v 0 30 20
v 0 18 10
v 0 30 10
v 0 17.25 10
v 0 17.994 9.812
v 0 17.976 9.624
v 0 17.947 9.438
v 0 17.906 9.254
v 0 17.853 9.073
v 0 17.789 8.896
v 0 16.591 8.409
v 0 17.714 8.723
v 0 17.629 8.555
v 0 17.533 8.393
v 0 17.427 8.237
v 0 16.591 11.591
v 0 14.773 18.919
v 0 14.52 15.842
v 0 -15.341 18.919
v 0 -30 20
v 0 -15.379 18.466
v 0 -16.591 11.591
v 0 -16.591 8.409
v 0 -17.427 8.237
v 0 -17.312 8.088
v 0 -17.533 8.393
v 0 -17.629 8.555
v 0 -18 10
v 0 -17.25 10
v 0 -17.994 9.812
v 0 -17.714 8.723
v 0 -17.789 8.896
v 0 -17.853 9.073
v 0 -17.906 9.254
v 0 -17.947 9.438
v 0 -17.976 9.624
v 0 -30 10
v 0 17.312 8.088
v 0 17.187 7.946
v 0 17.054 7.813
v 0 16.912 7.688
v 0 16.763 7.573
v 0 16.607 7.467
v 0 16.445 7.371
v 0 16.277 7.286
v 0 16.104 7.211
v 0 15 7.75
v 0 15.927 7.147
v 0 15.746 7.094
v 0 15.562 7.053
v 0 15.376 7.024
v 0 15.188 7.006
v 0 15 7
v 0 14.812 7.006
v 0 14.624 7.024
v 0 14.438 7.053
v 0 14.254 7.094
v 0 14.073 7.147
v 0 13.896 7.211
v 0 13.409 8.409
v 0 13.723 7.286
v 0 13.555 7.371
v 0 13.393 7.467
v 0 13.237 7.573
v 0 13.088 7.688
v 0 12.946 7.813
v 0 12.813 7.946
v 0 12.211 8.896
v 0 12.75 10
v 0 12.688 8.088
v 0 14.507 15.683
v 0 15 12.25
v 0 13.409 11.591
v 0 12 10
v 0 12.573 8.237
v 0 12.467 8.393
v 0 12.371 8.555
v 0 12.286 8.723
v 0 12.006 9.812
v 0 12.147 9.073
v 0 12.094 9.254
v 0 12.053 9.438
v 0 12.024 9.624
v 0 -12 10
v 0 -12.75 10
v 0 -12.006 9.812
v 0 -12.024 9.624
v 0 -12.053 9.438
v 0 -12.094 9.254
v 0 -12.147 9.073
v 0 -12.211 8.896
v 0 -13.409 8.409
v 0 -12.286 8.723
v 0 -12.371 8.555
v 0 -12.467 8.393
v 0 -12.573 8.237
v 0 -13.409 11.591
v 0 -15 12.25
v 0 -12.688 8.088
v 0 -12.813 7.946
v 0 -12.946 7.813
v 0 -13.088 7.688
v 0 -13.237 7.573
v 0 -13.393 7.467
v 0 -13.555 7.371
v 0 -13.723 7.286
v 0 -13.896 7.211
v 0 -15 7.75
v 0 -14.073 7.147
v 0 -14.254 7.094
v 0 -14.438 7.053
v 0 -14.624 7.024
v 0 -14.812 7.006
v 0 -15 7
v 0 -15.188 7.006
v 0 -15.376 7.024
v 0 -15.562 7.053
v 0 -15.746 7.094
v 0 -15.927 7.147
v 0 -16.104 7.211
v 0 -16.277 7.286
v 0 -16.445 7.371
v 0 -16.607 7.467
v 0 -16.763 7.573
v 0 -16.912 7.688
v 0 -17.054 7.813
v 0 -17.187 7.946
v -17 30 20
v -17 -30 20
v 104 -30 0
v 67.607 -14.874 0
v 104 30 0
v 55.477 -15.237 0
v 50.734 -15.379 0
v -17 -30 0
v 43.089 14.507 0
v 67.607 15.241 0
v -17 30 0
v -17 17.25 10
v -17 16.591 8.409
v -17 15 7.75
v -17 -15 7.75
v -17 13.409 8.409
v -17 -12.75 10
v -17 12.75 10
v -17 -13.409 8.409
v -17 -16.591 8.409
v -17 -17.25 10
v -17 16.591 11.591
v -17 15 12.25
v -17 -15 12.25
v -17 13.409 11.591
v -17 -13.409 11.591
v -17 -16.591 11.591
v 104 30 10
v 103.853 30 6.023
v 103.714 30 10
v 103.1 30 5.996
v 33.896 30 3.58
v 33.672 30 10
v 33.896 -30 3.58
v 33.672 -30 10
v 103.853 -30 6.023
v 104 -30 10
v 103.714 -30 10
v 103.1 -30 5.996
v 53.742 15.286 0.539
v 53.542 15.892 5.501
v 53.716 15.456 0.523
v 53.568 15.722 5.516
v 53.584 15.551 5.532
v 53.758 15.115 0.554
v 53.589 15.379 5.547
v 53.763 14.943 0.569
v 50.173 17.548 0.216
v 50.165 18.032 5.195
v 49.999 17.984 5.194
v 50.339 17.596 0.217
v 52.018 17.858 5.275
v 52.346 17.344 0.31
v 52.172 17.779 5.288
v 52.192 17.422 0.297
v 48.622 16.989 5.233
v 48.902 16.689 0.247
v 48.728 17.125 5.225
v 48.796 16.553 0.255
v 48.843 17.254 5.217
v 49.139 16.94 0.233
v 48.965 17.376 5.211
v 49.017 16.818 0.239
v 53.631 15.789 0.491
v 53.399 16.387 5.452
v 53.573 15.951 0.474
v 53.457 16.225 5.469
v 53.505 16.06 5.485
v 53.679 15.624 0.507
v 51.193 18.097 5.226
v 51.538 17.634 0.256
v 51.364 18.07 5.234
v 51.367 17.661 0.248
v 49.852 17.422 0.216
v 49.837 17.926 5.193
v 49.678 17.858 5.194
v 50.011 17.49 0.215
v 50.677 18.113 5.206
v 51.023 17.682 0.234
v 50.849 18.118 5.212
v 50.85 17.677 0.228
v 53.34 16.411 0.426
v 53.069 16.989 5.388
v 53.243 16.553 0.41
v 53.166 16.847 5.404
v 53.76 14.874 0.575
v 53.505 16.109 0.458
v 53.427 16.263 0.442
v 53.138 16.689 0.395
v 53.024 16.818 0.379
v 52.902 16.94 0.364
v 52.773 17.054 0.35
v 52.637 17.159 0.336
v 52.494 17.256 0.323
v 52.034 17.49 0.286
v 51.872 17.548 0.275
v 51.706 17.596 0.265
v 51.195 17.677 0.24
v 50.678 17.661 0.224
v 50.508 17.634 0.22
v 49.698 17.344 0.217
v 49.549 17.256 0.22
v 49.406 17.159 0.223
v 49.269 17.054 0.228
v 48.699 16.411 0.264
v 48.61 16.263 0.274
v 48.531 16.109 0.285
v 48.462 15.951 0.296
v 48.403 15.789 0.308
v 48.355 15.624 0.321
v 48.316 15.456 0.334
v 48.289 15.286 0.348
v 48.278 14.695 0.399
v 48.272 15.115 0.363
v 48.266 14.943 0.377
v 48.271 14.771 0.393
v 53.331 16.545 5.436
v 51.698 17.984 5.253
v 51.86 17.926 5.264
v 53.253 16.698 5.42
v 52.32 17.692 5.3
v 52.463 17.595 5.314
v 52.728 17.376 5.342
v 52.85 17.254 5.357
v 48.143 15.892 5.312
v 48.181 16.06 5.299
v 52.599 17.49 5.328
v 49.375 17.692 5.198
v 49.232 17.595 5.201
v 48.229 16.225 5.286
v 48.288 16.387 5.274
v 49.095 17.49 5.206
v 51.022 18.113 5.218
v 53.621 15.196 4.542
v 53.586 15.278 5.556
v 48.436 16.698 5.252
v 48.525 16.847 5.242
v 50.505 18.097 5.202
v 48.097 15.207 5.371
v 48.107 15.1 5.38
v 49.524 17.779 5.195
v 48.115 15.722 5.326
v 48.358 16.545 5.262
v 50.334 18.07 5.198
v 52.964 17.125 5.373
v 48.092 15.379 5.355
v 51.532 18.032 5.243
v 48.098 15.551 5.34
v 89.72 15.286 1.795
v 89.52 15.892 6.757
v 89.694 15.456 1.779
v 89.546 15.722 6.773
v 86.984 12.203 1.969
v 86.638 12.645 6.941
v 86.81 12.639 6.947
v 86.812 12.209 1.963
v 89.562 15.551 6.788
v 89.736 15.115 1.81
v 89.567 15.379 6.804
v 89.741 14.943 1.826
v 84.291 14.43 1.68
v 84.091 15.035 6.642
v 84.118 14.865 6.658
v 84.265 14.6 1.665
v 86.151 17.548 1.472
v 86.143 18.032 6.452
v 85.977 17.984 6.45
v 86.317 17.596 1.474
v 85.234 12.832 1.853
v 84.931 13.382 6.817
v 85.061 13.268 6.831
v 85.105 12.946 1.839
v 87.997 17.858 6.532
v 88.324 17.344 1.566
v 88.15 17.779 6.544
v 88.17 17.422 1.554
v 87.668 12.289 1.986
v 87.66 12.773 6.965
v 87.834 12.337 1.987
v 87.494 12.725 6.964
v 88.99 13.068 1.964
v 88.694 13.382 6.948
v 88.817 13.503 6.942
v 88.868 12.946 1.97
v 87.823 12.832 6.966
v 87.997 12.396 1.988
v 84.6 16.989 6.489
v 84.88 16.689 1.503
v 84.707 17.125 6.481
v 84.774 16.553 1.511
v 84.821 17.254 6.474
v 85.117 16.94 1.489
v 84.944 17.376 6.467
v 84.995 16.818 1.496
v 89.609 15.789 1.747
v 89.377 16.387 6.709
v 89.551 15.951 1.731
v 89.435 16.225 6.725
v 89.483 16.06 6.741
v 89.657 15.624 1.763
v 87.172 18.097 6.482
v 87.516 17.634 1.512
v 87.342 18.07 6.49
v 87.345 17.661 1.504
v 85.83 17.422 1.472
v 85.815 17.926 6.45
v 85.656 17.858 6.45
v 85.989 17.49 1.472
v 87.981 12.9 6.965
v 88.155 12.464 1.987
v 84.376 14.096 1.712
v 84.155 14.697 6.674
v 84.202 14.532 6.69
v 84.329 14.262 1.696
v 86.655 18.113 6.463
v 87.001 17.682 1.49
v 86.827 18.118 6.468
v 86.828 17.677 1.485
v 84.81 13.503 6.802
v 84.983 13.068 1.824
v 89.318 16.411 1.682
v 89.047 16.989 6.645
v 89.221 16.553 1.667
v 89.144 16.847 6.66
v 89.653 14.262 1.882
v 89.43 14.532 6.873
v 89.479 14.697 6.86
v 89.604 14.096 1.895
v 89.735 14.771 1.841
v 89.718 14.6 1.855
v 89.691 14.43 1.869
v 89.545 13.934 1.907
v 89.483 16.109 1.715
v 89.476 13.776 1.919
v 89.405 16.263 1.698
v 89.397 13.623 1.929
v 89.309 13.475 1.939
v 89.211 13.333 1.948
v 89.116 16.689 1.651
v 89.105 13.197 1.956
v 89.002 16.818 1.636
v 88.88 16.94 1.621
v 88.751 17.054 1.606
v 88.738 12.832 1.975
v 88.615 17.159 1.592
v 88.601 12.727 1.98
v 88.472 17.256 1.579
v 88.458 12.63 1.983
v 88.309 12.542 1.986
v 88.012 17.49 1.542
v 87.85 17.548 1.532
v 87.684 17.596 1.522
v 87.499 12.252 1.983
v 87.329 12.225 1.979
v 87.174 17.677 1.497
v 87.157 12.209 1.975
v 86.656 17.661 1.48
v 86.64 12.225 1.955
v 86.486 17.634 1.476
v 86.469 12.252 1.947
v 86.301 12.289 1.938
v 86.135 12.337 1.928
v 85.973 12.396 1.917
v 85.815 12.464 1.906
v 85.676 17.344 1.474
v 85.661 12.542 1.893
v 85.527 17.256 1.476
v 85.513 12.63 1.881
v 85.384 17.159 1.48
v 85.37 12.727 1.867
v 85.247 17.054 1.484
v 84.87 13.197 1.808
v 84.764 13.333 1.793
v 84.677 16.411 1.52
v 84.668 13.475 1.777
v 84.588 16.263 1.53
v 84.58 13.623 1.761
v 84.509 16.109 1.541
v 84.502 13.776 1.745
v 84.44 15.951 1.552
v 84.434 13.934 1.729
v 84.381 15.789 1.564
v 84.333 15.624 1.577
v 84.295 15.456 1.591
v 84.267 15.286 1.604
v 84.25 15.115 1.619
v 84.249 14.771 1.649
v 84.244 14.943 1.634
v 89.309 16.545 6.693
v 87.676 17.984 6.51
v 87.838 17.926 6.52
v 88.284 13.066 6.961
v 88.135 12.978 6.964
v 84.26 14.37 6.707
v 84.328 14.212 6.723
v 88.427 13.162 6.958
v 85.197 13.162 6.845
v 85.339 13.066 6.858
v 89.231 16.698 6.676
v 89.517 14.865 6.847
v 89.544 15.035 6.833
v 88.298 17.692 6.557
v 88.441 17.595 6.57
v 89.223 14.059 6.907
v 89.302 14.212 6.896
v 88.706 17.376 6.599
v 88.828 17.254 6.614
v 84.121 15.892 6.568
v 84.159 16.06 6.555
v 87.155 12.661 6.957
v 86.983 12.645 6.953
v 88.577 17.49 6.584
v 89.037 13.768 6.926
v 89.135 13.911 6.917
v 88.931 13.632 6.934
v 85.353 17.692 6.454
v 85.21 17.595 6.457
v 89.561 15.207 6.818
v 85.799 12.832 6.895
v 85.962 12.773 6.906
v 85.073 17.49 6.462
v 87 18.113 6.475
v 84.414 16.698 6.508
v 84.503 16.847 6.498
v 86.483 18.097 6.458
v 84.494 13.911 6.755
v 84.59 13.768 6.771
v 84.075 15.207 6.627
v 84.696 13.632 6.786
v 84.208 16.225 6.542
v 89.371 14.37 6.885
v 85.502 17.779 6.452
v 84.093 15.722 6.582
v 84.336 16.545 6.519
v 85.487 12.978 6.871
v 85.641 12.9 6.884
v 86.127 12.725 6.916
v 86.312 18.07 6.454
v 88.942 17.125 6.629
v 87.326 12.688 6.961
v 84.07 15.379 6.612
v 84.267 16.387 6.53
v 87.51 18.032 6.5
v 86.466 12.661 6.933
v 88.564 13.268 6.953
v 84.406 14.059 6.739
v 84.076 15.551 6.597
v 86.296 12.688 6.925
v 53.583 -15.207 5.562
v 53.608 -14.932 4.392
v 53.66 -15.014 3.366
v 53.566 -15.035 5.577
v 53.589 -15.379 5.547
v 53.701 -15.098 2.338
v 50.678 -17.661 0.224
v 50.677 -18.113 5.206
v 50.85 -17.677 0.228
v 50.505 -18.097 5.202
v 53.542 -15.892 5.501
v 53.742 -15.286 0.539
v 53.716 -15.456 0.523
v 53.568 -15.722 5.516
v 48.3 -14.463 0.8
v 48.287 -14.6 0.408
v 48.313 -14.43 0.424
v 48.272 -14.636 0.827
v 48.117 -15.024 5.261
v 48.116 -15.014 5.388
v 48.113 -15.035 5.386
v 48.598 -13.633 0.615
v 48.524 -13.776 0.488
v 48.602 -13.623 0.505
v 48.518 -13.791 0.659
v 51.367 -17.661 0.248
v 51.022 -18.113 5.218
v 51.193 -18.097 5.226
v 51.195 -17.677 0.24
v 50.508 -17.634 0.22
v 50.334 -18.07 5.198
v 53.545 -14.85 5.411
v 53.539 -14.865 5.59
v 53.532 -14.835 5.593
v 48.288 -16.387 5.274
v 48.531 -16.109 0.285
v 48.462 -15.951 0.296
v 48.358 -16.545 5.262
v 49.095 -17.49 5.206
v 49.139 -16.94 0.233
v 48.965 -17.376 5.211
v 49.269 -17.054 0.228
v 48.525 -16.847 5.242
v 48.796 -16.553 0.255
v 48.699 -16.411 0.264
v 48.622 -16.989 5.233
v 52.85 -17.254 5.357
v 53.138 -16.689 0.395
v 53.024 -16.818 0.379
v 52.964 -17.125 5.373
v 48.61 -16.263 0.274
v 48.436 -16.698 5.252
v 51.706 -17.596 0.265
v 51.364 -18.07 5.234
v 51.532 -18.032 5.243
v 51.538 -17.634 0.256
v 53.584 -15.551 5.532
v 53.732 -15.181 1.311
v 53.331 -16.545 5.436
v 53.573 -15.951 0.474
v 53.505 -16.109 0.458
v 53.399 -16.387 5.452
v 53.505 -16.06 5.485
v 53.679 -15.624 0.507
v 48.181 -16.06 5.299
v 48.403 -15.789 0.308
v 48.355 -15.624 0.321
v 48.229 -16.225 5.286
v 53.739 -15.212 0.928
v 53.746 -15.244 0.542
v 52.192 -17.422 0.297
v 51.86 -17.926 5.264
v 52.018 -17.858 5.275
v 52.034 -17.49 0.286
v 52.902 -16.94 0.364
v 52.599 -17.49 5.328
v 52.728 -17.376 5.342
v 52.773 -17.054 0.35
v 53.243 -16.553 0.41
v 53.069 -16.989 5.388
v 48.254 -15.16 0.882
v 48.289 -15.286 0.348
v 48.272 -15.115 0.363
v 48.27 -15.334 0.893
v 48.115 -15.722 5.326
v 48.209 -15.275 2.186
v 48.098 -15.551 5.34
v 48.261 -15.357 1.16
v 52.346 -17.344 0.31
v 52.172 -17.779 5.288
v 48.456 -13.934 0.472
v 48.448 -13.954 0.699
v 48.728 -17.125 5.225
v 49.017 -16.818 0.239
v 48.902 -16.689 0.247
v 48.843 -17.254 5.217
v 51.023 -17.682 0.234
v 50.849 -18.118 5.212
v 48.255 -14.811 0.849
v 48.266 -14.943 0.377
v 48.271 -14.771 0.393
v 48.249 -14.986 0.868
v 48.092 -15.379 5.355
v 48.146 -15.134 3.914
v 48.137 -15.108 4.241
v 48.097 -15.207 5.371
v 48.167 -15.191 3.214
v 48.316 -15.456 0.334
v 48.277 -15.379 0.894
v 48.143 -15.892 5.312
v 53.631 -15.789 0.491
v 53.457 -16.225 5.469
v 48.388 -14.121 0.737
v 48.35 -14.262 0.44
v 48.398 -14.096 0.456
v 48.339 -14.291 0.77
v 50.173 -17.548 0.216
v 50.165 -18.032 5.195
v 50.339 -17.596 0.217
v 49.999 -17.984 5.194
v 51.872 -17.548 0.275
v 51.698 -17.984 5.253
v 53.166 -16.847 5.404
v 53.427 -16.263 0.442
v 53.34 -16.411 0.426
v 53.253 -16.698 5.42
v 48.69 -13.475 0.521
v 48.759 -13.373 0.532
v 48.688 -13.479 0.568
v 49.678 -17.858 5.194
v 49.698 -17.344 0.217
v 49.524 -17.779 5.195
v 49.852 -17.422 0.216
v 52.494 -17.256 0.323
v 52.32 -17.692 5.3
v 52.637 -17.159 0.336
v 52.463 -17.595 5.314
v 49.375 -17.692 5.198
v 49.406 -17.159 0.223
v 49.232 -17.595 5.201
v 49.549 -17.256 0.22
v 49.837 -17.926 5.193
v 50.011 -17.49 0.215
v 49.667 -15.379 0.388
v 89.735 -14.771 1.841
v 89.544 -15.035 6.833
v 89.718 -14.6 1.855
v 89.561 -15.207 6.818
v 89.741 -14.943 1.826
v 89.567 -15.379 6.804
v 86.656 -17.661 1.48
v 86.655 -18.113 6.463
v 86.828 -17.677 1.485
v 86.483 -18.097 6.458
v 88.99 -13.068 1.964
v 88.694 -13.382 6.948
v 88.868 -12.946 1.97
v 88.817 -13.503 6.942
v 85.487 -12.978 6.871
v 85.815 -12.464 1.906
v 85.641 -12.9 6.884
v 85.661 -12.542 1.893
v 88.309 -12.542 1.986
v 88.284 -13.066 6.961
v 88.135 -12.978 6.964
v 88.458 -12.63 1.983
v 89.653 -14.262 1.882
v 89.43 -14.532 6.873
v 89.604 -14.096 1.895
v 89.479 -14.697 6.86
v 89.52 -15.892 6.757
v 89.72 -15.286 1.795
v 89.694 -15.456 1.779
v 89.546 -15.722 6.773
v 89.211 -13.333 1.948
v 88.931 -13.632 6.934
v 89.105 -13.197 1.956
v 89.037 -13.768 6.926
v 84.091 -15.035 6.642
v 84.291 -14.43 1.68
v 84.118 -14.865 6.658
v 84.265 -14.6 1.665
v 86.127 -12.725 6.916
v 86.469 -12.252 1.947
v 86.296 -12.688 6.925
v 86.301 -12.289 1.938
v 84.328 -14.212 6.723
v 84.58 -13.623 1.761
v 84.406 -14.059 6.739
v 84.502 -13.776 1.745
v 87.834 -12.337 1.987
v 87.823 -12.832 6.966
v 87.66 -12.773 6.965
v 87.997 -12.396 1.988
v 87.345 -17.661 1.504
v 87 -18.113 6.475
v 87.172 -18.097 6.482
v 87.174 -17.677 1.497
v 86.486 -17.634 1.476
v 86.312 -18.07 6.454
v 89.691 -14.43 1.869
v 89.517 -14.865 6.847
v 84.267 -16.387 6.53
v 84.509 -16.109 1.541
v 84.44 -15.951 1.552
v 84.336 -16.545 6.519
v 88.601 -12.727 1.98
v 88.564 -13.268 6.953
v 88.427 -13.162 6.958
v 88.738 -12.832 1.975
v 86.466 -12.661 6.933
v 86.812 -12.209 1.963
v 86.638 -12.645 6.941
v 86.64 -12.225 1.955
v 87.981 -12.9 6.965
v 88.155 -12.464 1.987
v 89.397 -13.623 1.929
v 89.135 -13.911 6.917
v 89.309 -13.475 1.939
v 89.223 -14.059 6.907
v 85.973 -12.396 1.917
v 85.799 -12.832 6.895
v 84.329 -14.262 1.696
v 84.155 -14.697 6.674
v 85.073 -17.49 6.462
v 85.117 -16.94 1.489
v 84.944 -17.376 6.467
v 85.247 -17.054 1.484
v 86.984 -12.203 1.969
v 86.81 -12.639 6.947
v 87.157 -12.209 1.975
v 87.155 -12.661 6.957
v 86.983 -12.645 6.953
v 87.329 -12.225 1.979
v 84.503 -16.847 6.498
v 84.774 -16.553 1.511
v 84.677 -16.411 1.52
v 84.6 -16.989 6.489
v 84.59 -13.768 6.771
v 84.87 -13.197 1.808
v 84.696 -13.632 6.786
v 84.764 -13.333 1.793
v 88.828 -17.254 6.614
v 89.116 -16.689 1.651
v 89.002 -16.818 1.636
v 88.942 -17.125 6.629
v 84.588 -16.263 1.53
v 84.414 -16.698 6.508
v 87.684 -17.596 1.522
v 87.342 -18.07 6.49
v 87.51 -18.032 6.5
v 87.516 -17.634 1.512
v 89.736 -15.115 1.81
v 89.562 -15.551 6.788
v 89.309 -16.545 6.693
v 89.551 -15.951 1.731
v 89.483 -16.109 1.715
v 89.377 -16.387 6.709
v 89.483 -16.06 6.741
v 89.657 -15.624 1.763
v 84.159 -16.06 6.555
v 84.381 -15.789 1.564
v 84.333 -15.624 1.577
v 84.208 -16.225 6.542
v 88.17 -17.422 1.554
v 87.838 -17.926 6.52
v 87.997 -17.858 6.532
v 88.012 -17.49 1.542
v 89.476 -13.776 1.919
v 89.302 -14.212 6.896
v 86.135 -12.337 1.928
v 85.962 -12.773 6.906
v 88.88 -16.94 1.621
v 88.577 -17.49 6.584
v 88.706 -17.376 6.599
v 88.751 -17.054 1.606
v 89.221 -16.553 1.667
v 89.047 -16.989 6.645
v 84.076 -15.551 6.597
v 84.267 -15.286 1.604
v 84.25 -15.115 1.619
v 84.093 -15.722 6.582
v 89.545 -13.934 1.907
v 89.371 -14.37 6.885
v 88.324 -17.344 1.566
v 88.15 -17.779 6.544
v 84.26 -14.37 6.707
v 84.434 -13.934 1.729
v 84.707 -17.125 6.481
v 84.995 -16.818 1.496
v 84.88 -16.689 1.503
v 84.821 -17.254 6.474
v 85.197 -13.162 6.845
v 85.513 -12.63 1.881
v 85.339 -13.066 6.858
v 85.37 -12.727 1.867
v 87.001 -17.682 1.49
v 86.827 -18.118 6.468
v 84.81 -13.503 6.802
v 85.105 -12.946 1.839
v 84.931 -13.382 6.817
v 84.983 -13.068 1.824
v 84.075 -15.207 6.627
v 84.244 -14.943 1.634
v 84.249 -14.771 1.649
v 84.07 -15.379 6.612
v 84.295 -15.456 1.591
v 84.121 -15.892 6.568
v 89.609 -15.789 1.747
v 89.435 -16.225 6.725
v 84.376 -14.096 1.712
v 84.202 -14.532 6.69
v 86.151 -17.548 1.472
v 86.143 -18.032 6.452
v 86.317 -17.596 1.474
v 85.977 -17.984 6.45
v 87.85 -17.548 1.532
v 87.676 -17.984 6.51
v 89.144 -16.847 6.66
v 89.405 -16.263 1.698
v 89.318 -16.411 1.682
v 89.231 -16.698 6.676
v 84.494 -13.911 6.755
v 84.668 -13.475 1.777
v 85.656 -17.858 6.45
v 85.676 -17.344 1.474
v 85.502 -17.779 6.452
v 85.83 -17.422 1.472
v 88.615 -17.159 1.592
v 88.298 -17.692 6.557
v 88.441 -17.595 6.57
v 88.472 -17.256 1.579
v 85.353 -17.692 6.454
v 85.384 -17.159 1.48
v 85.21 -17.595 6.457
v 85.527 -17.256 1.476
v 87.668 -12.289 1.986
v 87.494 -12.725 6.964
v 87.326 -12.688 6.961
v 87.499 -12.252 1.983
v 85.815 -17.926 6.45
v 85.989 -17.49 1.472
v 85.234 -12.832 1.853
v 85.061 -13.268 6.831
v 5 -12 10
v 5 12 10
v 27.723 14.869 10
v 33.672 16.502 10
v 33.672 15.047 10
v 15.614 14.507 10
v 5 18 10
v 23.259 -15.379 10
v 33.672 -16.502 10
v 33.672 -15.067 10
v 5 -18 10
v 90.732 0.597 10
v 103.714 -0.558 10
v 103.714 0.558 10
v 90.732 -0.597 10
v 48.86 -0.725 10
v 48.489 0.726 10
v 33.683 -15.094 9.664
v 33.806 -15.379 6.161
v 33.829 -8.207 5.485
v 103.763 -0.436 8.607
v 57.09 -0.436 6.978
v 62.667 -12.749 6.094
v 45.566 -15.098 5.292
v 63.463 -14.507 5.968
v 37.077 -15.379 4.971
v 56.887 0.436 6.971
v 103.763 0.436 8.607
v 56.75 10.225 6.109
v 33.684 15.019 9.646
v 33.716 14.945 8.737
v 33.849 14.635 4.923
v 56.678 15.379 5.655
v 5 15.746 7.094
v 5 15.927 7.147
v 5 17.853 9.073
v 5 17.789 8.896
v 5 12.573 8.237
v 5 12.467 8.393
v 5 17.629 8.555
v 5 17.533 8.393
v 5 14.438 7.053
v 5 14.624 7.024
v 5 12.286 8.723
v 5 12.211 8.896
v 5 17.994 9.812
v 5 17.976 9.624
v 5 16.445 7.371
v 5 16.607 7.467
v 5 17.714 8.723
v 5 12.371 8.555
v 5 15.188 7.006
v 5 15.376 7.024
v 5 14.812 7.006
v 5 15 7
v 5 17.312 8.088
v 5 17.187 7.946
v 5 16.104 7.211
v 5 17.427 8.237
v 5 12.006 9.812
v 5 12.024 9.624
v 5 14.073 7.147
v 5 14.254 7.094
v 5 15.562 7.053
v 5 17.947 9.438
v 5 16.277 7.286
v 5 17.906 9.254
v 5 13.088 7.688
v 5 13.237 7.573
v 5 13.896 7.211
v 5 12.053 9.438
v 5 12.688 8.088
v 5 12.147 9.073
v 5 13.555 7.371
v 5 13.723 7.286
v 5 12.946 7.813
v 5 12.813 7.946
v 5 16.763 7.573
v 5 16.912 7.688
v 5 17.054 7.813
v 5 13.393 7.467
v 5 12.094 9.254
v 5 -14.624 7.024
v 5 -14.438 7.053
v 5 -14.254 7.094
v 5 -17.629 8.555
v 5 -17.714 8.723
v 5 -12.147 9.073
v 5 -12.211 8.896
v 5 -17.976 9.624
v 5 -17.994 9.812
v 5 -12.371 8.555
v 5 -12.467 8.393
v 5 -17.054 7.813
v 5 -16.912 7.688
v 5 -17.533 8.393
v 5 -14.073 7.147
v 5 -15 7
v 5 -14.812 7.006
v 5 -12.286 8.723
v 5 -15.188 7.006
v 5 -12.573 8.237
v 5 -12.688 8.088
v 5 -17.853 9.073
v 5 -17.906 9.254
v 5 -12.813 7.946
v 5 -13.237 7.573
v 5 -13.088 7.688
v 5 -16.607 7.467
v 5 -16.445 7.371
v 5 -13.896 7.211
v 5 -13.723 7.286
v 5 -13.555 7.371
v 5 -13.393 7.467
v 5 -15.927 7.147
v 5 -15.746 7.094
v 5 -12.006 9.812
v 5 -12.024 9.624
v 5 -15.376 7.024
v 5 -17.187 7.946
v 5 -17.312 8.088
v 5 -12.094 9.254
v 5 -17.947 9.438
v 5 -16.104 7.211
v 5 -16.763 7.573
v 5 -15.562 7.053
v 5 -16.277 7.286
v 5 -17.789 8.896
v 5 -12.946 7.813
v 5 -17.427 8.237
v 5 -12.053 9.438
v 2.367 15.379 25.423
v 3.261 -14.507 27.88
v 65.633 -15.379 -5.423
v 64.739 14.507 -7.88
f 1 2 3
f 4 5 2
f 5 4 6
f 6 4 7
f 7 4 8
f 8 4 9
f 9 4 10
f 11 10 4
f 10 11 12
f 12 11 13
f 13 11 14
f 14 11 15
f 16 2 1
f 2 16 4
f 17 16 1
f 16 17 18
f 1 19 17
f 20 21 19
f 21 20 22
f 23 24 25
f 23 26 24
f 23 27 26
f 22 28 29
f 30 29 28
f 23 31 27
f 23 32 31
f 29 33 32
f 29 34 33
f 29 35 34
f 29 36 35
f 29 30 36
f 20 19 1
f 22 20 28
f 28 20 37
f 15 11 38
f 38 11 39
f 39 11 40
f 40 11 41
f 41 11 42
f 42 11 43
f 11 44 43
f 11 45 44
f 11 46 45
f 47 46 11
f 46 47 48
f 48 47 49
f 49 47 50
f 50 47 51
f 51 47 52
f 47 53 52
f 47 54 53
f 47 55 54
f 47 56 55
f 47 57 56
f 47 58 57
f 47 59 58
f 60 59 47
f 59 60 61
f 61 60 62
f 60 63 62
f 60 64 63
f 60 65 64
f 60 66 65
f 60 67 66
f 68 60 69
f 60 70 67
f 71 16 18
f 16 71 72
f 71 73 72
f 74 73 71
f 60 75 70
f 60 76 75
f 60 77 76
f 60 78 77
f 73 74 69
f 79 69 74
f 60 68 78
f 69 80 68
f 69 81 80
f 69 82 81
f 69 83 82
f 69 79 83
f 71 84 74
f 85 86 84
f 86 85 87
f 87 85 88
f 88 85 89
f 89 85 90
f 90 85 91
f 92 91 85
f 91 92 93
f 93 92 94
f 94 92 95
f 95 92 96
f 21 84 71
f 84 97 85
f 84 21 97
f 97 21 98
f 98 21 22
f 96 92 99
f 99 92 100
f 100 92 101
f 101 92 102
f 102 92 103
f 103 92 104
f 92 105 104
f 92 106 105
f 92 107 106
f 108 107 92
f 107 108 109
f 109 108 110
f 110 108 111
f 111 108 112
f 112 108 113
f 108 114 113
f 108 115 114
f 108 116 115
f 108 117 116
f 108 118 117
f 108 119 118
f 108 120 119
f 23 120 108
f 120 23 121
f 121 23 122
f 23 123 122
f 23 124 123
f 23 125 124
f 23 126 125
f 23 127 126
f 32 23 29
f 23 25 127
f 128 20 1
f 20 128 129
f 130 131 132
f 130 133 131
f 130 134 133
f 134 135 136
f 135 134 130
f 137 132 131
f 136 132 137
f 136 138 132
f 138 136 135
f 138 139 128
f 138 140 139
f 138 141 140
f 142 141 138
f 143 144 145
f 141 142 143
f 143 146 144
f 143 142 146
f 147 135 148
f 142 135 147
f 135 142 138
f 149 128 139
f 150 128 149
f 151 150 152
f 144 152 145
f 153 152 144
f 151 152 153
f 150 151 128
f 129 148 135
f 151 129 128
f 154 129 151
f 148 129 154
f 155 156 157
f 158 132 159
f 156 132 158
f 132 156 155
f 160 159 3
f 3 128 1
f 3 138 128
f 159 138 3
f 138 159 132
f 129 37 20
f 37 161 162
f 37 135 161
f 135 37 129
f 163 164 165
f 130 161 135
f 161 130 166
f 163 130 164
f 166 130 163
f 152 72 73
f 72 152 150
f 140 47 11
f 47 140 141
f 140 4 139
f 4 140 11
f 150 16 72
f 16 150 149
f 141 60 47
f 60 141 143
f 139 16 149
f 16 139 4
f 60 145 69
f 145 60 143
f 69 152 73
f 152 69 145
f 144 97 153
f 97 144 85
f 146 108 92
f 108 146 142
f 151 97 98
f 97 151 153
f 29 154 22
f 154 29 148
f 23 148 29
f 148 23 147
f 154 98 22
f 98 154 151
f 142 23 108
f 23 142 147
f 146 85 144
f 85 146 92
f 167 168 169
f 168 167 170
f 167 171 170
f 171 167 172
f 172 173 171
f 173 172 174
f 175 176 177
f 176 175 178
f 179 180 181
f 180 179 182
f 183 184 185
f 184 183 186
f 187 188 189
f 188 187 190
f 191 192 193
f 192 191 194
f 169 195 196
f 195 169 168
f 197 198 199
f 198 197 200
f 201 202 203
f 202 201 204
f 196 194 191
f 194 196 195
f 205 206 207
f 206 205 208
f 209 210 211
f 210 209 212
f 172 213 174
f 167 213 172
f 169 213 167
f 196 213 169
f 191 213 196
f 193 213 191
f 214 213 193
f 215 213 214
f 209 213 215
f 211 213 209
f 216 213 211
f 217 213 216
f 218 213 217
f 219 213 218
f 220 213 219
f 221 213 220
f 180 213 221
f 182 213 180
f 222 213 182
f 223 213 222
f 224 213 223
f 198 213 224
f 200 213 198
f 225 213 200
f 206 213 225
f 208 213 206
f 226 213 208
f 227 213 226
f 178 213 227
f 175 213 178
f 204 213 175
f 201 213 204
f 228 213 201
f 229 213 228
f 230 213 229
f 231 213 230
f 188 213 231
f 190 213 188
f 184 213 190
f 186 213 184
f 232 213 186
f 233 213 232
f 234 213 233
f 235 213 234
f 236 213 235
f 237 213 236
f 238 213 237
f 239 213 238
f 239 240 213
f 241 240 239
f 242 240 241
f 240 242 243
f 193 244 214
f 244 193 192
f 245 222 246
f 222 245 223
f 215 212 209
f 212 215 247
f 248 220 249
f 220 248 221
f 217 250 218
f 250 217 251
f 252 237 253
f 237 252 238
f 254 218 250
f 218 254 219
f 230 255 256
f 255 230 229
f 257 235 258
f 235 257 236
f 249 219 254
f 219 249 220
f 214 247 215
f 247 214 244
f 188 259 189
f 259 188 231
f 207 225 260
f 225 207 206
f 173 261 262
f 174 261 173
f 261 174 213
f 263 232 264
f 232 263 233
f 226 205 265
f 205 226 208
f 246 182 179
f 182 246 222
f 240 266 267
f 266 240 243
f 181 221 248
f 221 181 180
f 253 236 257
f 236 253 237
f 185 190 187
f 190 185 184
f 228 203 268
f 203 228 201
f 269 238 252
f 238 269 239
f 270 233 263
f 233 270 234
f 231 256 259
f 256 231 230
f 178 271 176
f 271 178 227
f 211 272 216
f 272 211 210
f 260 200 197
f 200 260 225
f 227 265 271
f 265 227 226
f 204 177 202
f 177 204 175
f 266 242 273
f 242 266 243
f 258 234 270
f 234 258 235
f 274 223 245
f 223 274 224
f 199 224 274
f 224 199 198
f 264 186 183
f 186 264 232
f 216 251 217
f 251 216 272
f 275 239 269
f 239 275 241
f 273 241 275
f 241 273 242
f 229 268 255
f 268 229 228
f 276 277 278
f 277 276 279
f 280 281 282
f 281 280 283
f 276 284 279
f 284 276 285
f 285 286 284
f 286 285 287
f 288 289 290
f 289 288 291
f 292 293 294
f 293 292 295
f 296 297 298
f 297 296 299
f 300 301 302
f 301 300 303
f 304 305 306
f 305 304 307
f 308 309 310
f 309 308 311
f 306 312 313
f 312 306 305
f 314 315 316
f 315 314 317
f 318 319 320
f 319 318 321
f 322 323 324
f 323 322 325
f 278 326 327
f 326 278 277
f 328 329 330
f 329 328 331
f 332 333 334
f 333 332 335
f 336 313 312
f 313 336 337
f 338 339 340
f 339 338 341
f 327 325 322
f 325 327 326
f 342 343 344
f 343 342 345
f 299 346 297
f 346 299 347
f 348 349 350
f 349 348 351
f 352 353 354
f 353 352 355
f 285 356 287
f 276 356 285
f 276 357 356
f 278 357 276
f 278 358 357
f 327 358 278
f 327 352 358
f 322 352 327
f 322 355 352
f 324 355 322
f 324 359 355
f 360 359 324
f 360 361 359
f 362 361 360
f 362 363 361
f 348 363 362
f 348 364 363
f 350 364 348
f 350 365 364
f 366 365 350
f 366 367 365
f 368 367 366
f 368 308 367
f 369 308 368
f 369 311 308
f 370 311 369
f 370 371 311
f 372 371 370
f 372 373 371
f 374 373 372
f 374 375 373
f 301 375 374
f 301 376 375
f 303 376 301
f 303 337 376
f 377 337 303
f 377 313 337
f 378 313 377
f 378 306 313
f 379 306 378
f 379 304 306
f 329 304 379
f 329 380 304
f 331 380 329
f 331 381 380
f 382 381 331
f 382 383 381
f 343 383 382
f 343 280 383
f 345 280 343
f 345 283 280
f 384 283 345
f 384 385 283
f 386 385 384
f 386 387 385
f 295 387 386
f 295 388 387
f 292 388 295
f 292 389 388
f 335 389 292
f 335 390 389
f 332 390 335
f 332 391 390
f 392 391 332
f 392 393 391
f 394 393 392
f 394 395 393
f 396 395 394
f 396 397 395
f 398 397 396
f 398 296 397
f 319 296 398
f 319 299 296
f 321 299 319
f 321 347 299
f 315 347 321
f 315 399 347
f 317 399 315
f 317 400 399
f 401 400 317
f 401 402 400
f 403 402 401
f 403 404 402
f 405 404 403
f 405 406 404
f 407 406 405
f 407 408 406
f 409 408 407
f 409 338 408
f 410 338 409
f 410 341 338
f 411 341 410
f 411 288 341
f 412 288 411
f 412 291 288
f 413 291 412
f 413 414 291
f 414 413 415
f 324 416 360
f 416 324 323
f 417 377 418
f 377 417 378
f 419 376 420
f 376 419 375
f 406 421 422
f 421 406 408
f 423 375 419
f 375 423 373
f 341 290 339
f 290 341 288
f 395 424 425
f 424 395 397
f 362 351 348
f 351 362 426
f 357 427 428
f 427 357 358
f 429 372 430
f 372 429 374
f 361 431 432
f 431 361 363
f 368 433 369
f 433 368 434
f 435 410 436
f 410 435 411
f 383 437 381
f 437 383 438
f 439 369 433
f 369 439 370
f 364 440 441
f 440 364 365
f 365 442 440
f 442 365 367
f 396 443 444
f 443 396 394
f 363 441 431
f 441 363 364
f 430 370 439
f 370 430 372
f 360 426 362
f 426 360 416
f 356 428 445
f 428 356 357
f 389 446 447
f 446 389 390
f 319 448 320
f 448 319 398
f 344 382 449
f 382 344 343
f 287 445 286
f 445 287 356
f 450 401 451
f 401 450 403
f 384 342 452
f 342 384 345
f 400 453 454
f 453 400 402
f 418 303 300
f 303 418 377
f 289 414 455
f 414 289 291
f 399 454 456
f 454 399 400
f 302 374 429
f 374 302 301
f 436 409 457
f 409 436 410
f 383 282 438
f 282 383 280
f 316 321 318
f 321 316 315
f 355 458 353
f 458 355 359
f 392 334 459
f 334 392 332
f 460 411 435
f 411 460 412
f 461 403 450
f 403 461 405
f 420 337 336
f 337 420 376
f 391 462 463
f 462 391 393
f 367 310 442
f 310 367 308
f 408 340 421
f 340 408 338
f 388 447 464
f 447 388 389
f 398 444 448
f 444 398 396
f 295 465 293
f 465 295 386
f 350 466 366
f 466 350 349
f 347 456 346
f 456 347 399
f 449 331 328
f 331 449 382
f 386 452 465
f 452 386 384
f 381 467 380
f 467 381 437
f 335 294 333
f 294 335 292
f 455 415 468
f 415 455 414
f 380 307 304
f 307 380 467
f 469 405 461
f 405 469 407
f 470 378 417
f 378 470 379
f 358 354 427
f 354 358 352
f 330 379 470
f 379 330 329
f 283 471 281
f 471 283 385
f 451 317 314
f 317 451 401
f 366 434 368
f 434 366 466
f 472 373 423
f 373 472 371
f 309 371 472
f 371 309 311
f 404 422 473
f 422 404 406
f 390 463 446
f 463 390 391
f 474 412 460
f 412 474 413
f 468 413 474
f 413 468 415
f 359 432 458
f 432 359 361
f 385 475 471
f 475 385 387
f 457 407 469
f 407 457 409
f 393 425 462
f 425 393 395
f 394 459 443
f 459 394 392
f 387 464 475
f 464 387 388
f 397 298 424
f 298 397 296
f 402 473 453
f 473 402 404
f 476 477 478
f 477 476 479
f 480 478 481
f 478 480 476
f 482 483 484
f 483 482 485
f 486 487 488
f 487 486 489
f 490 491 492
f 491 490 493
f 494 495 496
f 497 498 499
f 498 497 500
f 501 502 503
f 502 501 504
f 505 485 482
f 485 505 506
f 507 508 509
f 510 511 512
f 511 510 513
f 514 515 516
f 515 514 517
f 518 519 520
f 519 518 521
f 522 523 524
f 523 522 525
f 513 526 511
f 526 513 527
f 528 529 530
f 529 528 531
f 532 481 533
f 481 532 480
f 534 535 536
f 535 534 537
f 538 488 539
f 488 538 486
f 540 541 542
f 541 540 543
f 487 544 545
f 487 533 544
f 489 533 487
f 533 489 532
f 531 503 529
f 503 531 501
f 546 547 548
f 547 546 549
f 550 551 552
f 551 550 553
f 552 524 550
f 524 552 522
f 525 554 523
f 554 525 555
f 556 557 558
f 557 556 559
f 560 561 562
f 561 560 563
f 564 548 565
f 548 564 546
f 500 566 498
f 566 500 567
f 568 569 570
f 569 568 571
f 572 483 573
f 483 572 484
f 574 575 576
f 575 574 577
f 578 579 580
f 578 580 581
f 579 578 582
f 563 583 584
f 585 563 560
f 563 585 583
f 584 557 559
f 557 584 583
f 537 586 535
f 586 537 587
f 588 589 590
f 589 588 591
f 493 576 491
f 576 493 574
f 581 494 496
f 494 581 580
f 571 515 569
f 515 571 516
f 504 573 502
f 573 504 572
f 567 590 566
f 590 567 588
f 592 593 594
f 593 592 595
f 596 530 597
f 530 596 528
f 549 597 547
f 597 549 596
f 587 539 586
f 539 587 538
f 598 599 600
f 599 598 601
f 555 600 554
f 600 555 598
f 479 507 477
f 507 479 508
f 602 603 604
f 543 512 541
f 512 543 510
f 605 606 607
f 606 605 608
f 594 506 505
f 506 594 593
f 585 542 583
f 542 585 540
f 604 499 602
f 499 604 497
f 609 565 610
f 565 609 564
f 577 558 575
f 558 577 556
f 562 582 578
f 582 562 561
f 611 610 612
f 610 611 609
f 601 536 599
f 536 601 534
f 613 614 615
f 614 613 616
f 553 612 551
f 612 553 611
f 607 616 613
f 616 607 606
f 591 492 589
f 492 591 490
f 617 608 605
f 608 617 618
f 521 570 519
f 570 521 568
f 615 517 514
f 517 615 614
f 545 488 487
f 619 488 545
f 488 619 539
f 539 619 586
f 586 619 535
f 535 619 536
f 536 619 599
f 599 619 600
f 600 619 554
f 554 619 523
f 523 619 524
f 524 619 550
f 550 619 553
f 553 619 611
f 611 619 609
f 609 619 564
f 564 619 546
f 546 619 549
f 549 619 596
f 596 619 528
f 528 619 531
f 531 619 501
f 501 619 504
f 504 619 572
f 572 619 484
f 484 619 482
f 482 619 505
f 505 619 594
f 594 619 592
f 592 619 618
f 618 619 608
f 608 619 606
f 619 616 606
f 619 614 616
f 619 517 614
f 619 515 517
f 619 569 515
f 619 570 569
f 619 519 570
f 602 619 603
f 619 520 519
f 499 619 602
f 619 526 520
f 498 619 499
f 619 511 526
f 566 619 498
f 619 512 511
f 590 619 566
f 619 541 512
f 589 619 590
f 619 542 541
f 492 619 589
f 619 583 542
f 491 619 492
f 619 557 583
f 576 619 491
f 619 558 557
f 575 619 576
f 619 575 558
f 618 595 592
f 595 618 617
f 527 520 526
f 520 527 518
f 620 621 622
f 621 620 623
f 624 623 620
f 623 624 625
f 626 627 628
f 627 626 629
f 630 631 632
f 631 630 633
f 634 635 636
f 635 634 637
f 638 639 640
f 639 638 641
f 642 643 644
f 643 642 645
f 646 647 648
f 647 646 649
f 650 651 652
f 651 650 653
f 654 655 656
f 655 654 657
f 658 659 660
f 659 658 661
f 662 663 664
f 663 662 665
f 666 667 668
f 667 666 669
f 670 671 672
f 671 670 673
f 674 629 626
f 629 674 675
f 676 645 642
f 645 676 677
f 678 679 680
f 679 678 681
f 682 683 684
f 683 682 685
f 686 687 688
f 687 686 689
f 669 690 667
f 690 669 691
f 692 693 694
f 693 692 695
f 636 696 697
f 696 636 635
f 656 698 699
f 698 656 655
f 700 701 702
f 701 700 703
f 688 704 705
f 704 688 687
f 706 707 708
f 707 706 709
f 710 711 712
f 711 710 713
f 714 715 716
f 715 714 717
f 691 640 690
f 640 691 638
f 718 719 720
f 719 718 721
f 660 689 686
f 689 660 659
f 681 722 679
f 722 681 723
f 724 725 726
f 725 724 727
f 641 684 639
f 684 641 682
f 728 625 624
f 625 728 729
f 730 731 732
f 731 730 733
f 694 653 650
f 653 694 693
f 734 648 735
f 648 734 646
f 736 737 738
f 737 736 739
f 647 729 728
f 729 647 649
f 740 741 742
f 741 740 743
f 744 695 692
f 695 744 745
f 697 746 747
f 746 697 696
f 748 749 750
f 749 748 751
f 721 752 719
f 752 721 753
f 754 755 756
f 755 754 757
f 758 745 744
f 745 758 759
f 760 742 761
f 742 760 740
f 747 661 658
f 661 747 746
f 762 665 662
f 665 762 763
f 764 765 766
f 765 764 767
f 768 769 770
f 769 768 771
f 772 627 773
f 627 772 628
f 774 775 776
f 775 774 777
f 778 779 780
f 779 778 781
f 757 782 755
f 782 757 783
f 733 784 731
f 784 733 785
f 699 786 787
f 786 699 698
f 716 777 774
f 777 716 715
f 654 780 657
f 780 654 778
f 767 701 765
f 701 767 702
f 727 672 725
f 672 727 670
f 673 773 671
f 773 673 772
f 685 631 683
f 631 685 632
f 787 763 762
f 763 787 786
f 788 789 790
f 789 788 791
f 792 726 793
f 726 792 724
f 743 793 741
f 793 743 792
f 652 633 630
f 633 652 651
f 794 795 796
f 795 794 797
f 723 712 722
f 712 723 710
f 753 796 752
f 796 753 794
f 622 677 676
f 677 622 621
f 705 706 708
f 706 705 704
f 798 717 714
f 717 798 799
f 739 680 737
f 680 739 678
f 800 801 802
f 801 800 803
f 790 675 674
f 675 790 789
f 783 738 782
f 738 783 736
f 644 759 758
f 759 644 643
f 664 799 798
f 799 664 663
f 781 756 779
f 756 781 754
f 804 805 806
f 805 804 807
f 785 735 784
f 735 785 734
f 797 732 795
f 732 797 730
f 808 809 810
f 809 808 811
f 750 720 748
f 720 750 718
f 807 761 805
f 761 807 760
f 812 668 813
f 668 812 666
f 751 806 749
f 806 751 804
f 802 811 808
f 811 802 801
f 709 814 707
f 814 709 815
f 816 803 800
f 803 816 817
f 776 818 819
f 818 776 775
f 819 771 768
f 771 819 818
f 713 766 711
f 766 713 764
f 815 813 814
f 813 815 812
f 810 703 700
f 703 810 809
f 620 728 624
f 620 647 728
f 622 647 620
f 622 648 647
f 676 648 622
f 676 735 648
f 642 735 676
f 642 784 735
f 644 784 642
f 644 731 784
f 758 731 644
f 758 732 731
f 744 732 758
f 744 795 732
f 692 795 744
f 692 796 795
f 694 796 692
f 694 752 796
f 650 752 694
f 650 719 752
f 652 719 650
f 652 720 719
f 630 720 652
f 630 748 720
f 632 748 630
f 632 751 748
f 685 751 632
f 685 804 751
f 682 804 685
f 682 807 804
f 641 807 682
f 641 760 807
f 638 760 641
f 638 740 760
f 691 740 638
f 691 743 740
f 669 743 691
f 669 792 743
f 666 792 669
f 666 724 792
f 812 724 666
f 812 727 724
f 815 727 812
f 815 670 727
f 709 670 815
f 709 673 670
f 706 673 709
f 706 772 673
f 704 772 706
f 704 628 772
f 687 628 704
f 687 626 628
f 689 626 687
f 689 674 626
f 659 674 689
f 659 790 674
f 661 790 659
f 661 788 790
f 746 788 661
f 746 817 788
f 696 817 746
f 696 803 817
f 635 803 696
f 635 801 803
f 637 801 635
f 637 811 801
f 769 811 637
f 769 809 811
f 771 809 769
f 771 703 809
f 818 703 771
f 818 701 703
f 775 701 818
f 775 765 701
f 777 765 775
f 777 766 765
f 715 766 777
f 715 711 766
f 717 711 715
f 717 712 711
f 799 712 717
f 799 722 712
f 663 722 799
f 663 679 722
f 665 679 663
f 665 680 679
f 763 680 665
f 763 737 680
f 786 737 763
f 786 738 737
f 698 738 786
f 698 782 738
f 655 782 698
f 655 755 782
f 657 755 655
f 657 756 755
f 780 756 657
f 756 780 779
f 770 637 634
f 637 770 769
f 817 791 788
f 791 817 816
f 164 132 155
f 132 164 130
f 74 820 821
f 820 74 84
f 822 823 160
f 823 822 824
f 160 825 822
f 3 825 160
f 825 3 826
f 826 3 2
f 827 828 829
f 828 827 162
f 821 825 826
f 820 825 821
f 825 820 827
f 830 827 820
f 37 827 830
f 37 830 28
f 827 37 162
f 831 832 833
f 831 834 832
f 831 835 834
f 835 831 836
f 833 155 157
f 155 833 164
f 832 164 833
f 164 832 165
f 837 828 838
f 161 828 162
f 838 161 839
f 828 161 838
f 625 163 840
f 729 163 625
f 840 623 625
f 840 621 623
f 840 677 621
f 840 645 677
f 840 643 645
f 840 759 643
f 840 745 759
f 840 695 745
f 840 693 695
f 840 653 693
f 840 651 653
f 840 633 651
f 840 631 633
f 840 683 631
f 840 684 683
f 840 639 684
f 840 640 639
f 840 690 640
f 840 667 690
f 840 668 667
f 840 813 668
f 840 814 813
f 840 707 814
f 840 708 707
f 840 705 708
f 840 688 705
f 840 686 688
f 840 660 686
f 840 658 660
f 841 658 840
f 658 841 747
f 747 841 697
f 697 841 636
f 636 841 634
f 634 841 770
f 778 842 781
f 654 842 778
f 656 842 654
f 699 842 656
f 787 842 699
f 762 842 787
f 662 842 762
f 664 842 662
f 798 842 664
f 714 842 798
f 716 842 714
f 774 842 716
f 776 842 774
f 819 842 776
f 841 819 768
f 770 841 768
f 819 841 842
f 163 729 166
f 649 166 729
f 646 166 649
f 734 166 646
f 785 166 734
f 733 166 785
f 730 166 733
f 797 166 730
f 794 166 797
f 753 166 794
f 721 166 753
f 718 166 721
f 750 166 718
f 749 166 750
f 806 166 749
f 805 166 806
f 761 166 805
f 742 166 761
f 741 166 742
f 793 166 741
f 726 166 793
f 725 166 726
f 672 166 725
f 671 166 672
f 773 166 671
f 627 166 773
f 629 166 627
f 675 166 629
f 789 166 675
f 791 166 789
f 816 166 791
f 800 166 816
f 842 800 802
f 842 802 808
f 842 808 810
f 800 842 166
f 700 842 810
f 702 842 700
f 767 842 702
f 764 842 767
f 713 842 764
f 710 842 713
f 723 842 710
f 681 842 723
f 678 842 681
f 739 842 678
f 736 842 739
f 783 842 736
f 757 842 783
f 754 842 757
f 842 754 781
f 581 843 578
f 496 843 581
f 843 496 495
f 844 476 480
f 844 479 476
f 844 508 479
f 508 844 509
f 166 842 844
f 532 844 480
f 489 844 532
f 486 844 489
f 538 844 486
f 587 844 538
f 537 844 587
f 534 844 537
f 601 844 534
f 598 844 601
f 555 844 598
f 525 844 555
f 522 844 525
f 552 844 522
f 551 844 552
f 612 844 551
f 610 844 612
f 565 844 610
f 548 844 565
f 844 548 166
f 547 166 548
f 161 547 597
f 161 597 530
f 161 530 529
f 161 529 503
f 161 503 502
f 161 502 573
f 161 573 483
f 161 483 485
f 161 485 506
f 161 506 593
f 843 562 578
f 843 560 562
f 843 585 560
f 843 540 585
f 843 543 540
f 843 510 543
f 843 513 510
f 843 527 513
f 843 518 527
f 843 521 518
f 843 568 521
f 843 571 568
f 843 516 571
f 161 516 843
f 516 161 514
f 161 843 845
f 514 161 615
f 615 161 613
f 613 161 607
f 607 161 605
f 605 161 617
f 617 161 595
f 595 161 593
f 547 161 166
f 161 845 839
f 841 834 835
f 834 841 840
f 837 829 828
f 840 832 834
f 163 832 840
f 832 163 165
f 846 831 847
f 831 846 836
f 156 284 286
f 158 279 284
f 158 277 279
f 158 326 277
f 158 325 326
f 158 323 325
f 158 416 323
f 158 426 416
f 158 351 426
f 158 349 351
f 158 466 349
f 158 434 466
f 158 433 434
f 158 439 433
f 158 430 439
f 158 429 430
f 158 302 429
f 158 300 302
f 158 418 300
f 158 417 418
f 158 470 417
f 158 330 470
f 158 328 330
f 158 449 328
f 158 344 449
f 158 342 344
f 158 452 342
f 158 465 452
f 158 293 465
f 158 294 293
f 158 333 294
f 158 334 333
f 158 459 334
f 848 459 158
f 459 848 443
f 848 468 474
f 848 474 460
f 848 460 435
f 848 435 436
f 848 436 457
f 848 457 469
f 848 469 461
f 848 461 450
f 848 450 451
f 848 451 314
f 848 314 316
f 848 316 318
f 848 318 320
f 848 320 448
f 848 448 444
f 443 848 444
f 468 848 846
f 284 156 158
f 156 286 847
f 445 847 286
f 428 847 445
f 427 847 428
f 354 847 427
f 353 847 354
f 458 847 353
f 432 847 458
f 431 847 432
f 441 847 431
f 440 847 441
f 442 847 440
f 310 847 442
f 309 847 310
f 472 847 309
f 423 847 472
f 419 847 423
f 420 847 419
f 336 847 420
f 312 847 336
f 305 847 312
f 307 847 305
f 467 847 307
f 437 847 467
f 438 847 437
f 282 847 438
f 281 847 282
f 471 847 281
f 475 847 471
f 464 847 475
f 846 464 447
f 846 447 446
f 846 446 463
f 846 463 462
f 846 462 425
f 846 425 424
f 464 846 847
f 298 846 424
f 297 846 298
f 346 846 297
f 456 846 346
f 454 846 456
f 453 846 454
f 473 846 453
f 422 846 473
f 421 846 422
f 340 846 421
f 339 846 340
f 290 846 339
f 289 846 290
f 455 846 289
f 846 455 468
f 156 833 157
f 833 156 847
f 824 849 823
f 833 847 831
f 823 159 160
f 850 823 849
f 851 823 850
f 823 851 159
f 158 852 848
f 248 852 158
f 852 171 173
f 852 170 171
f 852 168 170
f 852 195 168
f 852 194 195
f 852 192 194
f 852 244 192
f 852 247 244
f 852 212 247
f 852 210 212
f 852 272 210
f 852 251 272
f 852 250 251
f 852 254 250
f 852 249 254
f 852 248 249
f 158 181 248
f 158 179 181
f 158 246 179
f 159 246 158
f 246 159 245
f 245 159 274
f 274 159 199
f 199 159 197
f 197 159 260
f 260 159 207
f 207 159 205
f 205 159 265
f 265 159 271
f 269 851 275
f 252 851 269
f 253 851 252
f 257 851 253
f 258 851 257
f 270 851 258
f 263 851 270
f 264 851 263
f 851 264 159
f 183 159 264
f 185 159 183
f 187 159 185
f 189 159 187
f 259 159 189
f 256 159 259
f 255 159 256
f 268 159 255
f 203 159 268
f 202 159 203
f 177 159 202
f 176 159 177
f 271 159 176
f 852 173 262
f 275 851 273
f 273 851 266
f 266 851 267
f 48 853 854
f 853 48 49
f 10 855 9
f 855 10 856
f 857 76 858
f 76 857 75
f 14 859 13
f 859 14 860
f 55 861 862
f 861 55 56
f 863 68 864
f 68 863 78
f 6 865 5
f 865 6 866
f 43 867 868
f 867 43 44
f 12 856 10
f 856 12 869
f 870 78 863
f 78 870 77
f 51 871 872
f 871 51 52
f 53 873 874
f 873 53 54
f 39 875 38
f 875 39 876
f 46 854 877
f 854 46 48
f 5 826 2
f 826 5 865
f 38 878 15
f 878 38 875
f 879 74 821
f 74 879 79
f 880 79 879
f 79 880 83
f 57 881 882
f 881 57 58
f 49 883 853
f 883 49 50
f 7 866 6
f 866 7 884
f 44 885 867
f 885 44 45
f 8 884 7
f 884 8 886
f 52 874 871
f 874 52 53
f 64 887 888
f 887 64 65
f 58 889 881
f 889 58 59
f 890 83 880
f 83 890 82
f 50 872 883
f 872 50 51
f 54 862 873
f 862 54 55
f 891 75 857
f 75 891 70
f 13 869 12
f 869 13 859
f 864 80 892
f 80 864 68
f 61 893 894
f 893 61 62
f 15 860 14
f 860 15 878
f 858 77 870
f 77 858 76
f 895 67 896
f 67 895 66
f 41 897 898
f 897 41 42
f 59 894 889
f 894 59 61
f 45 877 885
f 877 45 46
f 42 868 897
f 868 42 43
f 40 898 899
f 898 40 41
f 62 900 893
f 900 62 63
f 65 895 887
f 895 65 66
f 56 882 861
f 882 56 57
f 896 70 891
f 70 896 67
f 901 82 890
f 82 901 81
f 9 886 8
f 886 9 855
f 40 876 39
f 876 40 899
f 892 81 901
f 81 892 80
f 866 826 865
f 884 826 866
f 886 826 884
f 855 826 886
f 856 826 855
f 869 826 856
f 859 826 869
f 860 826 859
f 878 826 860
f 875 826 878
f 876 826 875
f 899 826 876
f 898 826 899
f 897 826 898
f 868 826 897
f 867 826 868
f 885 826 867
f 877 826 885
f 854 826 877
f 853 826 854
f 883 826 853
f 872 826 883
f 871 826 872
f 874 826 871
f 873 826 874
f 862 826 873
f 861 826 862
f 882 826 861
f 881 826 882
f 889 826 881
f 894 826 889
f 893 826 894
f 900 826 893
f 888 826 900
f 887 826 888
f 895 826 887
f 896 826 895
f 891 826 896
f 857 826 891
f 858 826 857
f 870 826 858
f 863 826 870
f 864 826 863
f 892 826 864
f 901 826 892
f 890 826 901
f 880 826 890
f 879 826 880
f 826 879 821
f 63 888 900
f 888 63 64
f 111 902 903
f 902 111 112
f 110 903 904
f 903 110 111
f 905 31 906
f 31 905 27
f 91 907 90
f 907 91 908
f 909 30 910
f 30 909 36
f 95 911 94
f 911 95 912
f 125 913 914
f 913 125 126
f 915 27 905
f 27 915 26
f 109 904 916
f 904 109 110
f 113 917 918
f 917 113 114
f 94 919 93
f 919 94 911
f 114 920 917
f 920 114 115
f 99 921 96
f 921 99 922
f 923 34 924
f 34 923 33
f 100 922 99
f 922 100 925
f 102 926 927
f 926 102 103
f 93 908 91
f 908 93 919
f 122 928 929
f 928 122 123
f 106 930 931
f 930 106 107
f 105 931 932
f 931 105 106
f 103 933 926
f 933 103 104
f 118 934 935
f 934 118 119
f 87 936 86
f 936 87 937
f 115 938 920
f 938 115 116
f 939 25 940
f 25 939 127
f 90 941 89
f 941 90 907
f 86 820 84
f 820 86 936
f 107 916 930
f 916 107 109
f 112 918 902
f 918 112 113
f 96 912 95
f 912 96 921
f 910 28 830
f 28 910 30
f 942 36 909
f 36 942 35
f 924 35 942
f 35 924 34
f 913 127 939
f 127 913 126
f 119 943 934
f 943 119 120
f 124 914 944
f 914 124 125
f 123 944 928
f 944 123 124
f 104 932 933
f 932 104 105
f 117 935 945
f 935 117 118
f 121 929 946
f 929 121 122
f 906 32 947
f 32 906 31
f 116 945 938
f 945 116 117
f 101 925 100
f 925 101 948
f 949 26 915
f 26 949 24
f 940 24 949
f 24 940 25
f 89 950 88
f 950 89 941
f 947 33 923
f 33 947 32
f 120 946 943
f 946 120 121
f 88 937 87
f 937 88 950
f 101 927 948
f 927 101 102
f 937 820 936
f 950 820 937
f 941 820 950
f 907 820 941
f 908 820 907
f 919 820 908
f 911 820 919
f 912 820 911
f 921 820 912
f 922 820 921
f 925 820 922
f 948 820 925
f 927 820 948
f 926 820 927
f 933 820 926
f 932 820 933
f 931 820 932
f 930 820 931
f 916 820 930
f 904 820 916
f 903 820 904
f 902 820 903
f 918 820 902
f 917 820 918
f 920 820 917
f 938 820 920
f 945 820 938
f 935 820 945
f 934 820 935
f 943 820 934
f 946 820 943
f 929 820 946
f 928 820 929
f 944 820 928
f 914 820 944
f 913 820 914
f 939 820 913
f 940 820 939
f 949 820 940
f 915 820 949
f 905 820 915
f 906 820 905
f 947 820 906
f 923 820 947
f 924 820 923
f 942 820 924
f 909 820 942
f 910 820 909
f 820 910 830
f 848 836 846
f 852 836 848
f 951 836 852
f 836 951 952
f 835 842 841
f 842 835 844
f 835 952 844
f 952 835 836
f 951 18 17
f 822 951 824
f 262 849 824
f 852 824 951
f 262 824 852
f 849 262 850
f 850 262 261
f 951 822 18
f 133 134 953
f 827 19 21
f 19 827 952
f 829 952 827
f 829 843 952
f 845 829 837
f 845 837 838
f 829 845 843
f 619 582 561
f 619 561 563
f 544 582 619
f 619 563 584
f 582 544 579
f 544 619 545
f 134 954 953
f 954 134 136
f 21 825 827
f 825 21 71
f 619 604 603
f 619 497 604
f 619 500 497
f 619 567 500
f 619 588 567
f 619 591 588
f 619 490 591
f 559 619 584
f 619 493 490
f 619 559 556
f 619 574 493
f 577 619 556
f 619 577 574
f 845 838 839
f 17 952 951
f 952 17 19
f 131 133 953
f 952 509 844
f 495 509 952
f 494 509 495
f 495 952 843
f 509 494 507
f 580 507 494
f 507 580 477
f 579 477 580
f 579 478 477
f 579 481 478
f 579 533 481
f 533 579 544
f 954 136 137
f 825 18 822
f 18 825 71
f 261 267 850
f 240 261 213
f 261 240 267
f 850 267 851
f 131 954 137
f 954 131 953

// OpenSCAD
//include<../UST/Parameters.scad>

draft = false;
center_diameter = 140;
center_height = 10;
connecting_module_length = 17;
distance_bearing = 180;
distance = distance_bearing-center_diameter/2 - connecting_module_length*2 -7;
leg_width = 60;
pitch_bearing = 15;
bearing_angle_side=5;
bearing_angle_inner=-2;

//Screw diameter and nut for M5 [mm]
M5_screw_diameter=5.5;
M5_head_height = 5;
M5_head_diameter = 13+0.5;
M5_nut_height = 4.5;
M5_nut_diameter = 9.4;
M5_nut_pocket = 8.4;


//Screw diameter and nut for M4 [mm]
M4_screw_diameter=4.5;
M4_screw_head_height = 4;
M4_nut_height = 3.2;
M4_nut_diameter = 8.4;
M4_nut_pocket = 7.5;
M4_screw_head_diameter=6;

g3_0_srcew_dist = 55;
//pripojovací část
difference(){
    translate([-connecting_module_length,-leg_width/2,0])
        cube([connecting_module_length,leg_width,center_height*2]);
    translate([-connecting_module_length/2,15,center_height])
        rotate([0,90,0]){
            cylinder(h=connecting_module_length*2,d=M4_screw_diameter,center=true);
        }
    translate([-connecting_module_length/2,-15,center_height])
        rotate([0,90,0]){
            cylinder(h=connecting_module_length*2,d=M4_screw_diameter,center=true);
        }
}

translate([distance-70+35,0,center_height])

rotate([-bearing_angle_side,20,0]){
    //translate([distance-70+35,0,center_height])
        cube([70,leg_width/2,center_height],center=true);
}
difference(){
    //základna
    translate([0,-leg_width/2,0])
        cube([distance+35,leg_width,center_height]);
    //naklon
    rotate([bearing_angle_side,bearing_angle_inner,0]){
        translate([distance+35-70,-leg_width/2,center_height-5])
            cube([70,leg_width/2,center_height]);
    }
    //naklon
    rotate([-bearing_angle_side,bearing_angle_inner,0]){
        translate([distance-70+35,0,center_height-5])
            cube([70,leg_width/2,center_height]);
    }
    connecting_bearing_hole();

    translate([0,15,center_height])
        rotate([0,90,0]){
        cylinder(h=5,d=M4_screw_head_diameter,$fn=draft?50:100);
    }
    translate([0,-15,center_height])
        rotate([0,90,0]){
        cylinder(h=5,d=M4_screw_head_diameter,$fn=draft?50:100);
    }

}

// diry pro pripojeni lozisek
module connecting_bearing_hole(y){
    rotate([-bearing_angle_side,bearing_angle_inner,0]){
        translate([distance-18,pitch_bearing,0])
            cylinder(h=center_height,d=M5_screw_diameter,$fn=draft?50:100);
        translate([distance+18,pitch_bearing,0])
            cylinder(h=center_height,d=M5_screw_diameter,$fn=draft?50:100);
    }

    rotate([bearing_angle_side,bearing_angle_inner,0]){
        translate([distance-18,-pitch_bearing,0])
            cylinder(h=center_height,d=M5_screw_diameter,$fn=draft?50:100);
        translate([distance+18,-pitch_bearing,0])
            cylinder(h=center_height,d=M5_screw_diameter,$fn=draft?50:100);
    }
}
